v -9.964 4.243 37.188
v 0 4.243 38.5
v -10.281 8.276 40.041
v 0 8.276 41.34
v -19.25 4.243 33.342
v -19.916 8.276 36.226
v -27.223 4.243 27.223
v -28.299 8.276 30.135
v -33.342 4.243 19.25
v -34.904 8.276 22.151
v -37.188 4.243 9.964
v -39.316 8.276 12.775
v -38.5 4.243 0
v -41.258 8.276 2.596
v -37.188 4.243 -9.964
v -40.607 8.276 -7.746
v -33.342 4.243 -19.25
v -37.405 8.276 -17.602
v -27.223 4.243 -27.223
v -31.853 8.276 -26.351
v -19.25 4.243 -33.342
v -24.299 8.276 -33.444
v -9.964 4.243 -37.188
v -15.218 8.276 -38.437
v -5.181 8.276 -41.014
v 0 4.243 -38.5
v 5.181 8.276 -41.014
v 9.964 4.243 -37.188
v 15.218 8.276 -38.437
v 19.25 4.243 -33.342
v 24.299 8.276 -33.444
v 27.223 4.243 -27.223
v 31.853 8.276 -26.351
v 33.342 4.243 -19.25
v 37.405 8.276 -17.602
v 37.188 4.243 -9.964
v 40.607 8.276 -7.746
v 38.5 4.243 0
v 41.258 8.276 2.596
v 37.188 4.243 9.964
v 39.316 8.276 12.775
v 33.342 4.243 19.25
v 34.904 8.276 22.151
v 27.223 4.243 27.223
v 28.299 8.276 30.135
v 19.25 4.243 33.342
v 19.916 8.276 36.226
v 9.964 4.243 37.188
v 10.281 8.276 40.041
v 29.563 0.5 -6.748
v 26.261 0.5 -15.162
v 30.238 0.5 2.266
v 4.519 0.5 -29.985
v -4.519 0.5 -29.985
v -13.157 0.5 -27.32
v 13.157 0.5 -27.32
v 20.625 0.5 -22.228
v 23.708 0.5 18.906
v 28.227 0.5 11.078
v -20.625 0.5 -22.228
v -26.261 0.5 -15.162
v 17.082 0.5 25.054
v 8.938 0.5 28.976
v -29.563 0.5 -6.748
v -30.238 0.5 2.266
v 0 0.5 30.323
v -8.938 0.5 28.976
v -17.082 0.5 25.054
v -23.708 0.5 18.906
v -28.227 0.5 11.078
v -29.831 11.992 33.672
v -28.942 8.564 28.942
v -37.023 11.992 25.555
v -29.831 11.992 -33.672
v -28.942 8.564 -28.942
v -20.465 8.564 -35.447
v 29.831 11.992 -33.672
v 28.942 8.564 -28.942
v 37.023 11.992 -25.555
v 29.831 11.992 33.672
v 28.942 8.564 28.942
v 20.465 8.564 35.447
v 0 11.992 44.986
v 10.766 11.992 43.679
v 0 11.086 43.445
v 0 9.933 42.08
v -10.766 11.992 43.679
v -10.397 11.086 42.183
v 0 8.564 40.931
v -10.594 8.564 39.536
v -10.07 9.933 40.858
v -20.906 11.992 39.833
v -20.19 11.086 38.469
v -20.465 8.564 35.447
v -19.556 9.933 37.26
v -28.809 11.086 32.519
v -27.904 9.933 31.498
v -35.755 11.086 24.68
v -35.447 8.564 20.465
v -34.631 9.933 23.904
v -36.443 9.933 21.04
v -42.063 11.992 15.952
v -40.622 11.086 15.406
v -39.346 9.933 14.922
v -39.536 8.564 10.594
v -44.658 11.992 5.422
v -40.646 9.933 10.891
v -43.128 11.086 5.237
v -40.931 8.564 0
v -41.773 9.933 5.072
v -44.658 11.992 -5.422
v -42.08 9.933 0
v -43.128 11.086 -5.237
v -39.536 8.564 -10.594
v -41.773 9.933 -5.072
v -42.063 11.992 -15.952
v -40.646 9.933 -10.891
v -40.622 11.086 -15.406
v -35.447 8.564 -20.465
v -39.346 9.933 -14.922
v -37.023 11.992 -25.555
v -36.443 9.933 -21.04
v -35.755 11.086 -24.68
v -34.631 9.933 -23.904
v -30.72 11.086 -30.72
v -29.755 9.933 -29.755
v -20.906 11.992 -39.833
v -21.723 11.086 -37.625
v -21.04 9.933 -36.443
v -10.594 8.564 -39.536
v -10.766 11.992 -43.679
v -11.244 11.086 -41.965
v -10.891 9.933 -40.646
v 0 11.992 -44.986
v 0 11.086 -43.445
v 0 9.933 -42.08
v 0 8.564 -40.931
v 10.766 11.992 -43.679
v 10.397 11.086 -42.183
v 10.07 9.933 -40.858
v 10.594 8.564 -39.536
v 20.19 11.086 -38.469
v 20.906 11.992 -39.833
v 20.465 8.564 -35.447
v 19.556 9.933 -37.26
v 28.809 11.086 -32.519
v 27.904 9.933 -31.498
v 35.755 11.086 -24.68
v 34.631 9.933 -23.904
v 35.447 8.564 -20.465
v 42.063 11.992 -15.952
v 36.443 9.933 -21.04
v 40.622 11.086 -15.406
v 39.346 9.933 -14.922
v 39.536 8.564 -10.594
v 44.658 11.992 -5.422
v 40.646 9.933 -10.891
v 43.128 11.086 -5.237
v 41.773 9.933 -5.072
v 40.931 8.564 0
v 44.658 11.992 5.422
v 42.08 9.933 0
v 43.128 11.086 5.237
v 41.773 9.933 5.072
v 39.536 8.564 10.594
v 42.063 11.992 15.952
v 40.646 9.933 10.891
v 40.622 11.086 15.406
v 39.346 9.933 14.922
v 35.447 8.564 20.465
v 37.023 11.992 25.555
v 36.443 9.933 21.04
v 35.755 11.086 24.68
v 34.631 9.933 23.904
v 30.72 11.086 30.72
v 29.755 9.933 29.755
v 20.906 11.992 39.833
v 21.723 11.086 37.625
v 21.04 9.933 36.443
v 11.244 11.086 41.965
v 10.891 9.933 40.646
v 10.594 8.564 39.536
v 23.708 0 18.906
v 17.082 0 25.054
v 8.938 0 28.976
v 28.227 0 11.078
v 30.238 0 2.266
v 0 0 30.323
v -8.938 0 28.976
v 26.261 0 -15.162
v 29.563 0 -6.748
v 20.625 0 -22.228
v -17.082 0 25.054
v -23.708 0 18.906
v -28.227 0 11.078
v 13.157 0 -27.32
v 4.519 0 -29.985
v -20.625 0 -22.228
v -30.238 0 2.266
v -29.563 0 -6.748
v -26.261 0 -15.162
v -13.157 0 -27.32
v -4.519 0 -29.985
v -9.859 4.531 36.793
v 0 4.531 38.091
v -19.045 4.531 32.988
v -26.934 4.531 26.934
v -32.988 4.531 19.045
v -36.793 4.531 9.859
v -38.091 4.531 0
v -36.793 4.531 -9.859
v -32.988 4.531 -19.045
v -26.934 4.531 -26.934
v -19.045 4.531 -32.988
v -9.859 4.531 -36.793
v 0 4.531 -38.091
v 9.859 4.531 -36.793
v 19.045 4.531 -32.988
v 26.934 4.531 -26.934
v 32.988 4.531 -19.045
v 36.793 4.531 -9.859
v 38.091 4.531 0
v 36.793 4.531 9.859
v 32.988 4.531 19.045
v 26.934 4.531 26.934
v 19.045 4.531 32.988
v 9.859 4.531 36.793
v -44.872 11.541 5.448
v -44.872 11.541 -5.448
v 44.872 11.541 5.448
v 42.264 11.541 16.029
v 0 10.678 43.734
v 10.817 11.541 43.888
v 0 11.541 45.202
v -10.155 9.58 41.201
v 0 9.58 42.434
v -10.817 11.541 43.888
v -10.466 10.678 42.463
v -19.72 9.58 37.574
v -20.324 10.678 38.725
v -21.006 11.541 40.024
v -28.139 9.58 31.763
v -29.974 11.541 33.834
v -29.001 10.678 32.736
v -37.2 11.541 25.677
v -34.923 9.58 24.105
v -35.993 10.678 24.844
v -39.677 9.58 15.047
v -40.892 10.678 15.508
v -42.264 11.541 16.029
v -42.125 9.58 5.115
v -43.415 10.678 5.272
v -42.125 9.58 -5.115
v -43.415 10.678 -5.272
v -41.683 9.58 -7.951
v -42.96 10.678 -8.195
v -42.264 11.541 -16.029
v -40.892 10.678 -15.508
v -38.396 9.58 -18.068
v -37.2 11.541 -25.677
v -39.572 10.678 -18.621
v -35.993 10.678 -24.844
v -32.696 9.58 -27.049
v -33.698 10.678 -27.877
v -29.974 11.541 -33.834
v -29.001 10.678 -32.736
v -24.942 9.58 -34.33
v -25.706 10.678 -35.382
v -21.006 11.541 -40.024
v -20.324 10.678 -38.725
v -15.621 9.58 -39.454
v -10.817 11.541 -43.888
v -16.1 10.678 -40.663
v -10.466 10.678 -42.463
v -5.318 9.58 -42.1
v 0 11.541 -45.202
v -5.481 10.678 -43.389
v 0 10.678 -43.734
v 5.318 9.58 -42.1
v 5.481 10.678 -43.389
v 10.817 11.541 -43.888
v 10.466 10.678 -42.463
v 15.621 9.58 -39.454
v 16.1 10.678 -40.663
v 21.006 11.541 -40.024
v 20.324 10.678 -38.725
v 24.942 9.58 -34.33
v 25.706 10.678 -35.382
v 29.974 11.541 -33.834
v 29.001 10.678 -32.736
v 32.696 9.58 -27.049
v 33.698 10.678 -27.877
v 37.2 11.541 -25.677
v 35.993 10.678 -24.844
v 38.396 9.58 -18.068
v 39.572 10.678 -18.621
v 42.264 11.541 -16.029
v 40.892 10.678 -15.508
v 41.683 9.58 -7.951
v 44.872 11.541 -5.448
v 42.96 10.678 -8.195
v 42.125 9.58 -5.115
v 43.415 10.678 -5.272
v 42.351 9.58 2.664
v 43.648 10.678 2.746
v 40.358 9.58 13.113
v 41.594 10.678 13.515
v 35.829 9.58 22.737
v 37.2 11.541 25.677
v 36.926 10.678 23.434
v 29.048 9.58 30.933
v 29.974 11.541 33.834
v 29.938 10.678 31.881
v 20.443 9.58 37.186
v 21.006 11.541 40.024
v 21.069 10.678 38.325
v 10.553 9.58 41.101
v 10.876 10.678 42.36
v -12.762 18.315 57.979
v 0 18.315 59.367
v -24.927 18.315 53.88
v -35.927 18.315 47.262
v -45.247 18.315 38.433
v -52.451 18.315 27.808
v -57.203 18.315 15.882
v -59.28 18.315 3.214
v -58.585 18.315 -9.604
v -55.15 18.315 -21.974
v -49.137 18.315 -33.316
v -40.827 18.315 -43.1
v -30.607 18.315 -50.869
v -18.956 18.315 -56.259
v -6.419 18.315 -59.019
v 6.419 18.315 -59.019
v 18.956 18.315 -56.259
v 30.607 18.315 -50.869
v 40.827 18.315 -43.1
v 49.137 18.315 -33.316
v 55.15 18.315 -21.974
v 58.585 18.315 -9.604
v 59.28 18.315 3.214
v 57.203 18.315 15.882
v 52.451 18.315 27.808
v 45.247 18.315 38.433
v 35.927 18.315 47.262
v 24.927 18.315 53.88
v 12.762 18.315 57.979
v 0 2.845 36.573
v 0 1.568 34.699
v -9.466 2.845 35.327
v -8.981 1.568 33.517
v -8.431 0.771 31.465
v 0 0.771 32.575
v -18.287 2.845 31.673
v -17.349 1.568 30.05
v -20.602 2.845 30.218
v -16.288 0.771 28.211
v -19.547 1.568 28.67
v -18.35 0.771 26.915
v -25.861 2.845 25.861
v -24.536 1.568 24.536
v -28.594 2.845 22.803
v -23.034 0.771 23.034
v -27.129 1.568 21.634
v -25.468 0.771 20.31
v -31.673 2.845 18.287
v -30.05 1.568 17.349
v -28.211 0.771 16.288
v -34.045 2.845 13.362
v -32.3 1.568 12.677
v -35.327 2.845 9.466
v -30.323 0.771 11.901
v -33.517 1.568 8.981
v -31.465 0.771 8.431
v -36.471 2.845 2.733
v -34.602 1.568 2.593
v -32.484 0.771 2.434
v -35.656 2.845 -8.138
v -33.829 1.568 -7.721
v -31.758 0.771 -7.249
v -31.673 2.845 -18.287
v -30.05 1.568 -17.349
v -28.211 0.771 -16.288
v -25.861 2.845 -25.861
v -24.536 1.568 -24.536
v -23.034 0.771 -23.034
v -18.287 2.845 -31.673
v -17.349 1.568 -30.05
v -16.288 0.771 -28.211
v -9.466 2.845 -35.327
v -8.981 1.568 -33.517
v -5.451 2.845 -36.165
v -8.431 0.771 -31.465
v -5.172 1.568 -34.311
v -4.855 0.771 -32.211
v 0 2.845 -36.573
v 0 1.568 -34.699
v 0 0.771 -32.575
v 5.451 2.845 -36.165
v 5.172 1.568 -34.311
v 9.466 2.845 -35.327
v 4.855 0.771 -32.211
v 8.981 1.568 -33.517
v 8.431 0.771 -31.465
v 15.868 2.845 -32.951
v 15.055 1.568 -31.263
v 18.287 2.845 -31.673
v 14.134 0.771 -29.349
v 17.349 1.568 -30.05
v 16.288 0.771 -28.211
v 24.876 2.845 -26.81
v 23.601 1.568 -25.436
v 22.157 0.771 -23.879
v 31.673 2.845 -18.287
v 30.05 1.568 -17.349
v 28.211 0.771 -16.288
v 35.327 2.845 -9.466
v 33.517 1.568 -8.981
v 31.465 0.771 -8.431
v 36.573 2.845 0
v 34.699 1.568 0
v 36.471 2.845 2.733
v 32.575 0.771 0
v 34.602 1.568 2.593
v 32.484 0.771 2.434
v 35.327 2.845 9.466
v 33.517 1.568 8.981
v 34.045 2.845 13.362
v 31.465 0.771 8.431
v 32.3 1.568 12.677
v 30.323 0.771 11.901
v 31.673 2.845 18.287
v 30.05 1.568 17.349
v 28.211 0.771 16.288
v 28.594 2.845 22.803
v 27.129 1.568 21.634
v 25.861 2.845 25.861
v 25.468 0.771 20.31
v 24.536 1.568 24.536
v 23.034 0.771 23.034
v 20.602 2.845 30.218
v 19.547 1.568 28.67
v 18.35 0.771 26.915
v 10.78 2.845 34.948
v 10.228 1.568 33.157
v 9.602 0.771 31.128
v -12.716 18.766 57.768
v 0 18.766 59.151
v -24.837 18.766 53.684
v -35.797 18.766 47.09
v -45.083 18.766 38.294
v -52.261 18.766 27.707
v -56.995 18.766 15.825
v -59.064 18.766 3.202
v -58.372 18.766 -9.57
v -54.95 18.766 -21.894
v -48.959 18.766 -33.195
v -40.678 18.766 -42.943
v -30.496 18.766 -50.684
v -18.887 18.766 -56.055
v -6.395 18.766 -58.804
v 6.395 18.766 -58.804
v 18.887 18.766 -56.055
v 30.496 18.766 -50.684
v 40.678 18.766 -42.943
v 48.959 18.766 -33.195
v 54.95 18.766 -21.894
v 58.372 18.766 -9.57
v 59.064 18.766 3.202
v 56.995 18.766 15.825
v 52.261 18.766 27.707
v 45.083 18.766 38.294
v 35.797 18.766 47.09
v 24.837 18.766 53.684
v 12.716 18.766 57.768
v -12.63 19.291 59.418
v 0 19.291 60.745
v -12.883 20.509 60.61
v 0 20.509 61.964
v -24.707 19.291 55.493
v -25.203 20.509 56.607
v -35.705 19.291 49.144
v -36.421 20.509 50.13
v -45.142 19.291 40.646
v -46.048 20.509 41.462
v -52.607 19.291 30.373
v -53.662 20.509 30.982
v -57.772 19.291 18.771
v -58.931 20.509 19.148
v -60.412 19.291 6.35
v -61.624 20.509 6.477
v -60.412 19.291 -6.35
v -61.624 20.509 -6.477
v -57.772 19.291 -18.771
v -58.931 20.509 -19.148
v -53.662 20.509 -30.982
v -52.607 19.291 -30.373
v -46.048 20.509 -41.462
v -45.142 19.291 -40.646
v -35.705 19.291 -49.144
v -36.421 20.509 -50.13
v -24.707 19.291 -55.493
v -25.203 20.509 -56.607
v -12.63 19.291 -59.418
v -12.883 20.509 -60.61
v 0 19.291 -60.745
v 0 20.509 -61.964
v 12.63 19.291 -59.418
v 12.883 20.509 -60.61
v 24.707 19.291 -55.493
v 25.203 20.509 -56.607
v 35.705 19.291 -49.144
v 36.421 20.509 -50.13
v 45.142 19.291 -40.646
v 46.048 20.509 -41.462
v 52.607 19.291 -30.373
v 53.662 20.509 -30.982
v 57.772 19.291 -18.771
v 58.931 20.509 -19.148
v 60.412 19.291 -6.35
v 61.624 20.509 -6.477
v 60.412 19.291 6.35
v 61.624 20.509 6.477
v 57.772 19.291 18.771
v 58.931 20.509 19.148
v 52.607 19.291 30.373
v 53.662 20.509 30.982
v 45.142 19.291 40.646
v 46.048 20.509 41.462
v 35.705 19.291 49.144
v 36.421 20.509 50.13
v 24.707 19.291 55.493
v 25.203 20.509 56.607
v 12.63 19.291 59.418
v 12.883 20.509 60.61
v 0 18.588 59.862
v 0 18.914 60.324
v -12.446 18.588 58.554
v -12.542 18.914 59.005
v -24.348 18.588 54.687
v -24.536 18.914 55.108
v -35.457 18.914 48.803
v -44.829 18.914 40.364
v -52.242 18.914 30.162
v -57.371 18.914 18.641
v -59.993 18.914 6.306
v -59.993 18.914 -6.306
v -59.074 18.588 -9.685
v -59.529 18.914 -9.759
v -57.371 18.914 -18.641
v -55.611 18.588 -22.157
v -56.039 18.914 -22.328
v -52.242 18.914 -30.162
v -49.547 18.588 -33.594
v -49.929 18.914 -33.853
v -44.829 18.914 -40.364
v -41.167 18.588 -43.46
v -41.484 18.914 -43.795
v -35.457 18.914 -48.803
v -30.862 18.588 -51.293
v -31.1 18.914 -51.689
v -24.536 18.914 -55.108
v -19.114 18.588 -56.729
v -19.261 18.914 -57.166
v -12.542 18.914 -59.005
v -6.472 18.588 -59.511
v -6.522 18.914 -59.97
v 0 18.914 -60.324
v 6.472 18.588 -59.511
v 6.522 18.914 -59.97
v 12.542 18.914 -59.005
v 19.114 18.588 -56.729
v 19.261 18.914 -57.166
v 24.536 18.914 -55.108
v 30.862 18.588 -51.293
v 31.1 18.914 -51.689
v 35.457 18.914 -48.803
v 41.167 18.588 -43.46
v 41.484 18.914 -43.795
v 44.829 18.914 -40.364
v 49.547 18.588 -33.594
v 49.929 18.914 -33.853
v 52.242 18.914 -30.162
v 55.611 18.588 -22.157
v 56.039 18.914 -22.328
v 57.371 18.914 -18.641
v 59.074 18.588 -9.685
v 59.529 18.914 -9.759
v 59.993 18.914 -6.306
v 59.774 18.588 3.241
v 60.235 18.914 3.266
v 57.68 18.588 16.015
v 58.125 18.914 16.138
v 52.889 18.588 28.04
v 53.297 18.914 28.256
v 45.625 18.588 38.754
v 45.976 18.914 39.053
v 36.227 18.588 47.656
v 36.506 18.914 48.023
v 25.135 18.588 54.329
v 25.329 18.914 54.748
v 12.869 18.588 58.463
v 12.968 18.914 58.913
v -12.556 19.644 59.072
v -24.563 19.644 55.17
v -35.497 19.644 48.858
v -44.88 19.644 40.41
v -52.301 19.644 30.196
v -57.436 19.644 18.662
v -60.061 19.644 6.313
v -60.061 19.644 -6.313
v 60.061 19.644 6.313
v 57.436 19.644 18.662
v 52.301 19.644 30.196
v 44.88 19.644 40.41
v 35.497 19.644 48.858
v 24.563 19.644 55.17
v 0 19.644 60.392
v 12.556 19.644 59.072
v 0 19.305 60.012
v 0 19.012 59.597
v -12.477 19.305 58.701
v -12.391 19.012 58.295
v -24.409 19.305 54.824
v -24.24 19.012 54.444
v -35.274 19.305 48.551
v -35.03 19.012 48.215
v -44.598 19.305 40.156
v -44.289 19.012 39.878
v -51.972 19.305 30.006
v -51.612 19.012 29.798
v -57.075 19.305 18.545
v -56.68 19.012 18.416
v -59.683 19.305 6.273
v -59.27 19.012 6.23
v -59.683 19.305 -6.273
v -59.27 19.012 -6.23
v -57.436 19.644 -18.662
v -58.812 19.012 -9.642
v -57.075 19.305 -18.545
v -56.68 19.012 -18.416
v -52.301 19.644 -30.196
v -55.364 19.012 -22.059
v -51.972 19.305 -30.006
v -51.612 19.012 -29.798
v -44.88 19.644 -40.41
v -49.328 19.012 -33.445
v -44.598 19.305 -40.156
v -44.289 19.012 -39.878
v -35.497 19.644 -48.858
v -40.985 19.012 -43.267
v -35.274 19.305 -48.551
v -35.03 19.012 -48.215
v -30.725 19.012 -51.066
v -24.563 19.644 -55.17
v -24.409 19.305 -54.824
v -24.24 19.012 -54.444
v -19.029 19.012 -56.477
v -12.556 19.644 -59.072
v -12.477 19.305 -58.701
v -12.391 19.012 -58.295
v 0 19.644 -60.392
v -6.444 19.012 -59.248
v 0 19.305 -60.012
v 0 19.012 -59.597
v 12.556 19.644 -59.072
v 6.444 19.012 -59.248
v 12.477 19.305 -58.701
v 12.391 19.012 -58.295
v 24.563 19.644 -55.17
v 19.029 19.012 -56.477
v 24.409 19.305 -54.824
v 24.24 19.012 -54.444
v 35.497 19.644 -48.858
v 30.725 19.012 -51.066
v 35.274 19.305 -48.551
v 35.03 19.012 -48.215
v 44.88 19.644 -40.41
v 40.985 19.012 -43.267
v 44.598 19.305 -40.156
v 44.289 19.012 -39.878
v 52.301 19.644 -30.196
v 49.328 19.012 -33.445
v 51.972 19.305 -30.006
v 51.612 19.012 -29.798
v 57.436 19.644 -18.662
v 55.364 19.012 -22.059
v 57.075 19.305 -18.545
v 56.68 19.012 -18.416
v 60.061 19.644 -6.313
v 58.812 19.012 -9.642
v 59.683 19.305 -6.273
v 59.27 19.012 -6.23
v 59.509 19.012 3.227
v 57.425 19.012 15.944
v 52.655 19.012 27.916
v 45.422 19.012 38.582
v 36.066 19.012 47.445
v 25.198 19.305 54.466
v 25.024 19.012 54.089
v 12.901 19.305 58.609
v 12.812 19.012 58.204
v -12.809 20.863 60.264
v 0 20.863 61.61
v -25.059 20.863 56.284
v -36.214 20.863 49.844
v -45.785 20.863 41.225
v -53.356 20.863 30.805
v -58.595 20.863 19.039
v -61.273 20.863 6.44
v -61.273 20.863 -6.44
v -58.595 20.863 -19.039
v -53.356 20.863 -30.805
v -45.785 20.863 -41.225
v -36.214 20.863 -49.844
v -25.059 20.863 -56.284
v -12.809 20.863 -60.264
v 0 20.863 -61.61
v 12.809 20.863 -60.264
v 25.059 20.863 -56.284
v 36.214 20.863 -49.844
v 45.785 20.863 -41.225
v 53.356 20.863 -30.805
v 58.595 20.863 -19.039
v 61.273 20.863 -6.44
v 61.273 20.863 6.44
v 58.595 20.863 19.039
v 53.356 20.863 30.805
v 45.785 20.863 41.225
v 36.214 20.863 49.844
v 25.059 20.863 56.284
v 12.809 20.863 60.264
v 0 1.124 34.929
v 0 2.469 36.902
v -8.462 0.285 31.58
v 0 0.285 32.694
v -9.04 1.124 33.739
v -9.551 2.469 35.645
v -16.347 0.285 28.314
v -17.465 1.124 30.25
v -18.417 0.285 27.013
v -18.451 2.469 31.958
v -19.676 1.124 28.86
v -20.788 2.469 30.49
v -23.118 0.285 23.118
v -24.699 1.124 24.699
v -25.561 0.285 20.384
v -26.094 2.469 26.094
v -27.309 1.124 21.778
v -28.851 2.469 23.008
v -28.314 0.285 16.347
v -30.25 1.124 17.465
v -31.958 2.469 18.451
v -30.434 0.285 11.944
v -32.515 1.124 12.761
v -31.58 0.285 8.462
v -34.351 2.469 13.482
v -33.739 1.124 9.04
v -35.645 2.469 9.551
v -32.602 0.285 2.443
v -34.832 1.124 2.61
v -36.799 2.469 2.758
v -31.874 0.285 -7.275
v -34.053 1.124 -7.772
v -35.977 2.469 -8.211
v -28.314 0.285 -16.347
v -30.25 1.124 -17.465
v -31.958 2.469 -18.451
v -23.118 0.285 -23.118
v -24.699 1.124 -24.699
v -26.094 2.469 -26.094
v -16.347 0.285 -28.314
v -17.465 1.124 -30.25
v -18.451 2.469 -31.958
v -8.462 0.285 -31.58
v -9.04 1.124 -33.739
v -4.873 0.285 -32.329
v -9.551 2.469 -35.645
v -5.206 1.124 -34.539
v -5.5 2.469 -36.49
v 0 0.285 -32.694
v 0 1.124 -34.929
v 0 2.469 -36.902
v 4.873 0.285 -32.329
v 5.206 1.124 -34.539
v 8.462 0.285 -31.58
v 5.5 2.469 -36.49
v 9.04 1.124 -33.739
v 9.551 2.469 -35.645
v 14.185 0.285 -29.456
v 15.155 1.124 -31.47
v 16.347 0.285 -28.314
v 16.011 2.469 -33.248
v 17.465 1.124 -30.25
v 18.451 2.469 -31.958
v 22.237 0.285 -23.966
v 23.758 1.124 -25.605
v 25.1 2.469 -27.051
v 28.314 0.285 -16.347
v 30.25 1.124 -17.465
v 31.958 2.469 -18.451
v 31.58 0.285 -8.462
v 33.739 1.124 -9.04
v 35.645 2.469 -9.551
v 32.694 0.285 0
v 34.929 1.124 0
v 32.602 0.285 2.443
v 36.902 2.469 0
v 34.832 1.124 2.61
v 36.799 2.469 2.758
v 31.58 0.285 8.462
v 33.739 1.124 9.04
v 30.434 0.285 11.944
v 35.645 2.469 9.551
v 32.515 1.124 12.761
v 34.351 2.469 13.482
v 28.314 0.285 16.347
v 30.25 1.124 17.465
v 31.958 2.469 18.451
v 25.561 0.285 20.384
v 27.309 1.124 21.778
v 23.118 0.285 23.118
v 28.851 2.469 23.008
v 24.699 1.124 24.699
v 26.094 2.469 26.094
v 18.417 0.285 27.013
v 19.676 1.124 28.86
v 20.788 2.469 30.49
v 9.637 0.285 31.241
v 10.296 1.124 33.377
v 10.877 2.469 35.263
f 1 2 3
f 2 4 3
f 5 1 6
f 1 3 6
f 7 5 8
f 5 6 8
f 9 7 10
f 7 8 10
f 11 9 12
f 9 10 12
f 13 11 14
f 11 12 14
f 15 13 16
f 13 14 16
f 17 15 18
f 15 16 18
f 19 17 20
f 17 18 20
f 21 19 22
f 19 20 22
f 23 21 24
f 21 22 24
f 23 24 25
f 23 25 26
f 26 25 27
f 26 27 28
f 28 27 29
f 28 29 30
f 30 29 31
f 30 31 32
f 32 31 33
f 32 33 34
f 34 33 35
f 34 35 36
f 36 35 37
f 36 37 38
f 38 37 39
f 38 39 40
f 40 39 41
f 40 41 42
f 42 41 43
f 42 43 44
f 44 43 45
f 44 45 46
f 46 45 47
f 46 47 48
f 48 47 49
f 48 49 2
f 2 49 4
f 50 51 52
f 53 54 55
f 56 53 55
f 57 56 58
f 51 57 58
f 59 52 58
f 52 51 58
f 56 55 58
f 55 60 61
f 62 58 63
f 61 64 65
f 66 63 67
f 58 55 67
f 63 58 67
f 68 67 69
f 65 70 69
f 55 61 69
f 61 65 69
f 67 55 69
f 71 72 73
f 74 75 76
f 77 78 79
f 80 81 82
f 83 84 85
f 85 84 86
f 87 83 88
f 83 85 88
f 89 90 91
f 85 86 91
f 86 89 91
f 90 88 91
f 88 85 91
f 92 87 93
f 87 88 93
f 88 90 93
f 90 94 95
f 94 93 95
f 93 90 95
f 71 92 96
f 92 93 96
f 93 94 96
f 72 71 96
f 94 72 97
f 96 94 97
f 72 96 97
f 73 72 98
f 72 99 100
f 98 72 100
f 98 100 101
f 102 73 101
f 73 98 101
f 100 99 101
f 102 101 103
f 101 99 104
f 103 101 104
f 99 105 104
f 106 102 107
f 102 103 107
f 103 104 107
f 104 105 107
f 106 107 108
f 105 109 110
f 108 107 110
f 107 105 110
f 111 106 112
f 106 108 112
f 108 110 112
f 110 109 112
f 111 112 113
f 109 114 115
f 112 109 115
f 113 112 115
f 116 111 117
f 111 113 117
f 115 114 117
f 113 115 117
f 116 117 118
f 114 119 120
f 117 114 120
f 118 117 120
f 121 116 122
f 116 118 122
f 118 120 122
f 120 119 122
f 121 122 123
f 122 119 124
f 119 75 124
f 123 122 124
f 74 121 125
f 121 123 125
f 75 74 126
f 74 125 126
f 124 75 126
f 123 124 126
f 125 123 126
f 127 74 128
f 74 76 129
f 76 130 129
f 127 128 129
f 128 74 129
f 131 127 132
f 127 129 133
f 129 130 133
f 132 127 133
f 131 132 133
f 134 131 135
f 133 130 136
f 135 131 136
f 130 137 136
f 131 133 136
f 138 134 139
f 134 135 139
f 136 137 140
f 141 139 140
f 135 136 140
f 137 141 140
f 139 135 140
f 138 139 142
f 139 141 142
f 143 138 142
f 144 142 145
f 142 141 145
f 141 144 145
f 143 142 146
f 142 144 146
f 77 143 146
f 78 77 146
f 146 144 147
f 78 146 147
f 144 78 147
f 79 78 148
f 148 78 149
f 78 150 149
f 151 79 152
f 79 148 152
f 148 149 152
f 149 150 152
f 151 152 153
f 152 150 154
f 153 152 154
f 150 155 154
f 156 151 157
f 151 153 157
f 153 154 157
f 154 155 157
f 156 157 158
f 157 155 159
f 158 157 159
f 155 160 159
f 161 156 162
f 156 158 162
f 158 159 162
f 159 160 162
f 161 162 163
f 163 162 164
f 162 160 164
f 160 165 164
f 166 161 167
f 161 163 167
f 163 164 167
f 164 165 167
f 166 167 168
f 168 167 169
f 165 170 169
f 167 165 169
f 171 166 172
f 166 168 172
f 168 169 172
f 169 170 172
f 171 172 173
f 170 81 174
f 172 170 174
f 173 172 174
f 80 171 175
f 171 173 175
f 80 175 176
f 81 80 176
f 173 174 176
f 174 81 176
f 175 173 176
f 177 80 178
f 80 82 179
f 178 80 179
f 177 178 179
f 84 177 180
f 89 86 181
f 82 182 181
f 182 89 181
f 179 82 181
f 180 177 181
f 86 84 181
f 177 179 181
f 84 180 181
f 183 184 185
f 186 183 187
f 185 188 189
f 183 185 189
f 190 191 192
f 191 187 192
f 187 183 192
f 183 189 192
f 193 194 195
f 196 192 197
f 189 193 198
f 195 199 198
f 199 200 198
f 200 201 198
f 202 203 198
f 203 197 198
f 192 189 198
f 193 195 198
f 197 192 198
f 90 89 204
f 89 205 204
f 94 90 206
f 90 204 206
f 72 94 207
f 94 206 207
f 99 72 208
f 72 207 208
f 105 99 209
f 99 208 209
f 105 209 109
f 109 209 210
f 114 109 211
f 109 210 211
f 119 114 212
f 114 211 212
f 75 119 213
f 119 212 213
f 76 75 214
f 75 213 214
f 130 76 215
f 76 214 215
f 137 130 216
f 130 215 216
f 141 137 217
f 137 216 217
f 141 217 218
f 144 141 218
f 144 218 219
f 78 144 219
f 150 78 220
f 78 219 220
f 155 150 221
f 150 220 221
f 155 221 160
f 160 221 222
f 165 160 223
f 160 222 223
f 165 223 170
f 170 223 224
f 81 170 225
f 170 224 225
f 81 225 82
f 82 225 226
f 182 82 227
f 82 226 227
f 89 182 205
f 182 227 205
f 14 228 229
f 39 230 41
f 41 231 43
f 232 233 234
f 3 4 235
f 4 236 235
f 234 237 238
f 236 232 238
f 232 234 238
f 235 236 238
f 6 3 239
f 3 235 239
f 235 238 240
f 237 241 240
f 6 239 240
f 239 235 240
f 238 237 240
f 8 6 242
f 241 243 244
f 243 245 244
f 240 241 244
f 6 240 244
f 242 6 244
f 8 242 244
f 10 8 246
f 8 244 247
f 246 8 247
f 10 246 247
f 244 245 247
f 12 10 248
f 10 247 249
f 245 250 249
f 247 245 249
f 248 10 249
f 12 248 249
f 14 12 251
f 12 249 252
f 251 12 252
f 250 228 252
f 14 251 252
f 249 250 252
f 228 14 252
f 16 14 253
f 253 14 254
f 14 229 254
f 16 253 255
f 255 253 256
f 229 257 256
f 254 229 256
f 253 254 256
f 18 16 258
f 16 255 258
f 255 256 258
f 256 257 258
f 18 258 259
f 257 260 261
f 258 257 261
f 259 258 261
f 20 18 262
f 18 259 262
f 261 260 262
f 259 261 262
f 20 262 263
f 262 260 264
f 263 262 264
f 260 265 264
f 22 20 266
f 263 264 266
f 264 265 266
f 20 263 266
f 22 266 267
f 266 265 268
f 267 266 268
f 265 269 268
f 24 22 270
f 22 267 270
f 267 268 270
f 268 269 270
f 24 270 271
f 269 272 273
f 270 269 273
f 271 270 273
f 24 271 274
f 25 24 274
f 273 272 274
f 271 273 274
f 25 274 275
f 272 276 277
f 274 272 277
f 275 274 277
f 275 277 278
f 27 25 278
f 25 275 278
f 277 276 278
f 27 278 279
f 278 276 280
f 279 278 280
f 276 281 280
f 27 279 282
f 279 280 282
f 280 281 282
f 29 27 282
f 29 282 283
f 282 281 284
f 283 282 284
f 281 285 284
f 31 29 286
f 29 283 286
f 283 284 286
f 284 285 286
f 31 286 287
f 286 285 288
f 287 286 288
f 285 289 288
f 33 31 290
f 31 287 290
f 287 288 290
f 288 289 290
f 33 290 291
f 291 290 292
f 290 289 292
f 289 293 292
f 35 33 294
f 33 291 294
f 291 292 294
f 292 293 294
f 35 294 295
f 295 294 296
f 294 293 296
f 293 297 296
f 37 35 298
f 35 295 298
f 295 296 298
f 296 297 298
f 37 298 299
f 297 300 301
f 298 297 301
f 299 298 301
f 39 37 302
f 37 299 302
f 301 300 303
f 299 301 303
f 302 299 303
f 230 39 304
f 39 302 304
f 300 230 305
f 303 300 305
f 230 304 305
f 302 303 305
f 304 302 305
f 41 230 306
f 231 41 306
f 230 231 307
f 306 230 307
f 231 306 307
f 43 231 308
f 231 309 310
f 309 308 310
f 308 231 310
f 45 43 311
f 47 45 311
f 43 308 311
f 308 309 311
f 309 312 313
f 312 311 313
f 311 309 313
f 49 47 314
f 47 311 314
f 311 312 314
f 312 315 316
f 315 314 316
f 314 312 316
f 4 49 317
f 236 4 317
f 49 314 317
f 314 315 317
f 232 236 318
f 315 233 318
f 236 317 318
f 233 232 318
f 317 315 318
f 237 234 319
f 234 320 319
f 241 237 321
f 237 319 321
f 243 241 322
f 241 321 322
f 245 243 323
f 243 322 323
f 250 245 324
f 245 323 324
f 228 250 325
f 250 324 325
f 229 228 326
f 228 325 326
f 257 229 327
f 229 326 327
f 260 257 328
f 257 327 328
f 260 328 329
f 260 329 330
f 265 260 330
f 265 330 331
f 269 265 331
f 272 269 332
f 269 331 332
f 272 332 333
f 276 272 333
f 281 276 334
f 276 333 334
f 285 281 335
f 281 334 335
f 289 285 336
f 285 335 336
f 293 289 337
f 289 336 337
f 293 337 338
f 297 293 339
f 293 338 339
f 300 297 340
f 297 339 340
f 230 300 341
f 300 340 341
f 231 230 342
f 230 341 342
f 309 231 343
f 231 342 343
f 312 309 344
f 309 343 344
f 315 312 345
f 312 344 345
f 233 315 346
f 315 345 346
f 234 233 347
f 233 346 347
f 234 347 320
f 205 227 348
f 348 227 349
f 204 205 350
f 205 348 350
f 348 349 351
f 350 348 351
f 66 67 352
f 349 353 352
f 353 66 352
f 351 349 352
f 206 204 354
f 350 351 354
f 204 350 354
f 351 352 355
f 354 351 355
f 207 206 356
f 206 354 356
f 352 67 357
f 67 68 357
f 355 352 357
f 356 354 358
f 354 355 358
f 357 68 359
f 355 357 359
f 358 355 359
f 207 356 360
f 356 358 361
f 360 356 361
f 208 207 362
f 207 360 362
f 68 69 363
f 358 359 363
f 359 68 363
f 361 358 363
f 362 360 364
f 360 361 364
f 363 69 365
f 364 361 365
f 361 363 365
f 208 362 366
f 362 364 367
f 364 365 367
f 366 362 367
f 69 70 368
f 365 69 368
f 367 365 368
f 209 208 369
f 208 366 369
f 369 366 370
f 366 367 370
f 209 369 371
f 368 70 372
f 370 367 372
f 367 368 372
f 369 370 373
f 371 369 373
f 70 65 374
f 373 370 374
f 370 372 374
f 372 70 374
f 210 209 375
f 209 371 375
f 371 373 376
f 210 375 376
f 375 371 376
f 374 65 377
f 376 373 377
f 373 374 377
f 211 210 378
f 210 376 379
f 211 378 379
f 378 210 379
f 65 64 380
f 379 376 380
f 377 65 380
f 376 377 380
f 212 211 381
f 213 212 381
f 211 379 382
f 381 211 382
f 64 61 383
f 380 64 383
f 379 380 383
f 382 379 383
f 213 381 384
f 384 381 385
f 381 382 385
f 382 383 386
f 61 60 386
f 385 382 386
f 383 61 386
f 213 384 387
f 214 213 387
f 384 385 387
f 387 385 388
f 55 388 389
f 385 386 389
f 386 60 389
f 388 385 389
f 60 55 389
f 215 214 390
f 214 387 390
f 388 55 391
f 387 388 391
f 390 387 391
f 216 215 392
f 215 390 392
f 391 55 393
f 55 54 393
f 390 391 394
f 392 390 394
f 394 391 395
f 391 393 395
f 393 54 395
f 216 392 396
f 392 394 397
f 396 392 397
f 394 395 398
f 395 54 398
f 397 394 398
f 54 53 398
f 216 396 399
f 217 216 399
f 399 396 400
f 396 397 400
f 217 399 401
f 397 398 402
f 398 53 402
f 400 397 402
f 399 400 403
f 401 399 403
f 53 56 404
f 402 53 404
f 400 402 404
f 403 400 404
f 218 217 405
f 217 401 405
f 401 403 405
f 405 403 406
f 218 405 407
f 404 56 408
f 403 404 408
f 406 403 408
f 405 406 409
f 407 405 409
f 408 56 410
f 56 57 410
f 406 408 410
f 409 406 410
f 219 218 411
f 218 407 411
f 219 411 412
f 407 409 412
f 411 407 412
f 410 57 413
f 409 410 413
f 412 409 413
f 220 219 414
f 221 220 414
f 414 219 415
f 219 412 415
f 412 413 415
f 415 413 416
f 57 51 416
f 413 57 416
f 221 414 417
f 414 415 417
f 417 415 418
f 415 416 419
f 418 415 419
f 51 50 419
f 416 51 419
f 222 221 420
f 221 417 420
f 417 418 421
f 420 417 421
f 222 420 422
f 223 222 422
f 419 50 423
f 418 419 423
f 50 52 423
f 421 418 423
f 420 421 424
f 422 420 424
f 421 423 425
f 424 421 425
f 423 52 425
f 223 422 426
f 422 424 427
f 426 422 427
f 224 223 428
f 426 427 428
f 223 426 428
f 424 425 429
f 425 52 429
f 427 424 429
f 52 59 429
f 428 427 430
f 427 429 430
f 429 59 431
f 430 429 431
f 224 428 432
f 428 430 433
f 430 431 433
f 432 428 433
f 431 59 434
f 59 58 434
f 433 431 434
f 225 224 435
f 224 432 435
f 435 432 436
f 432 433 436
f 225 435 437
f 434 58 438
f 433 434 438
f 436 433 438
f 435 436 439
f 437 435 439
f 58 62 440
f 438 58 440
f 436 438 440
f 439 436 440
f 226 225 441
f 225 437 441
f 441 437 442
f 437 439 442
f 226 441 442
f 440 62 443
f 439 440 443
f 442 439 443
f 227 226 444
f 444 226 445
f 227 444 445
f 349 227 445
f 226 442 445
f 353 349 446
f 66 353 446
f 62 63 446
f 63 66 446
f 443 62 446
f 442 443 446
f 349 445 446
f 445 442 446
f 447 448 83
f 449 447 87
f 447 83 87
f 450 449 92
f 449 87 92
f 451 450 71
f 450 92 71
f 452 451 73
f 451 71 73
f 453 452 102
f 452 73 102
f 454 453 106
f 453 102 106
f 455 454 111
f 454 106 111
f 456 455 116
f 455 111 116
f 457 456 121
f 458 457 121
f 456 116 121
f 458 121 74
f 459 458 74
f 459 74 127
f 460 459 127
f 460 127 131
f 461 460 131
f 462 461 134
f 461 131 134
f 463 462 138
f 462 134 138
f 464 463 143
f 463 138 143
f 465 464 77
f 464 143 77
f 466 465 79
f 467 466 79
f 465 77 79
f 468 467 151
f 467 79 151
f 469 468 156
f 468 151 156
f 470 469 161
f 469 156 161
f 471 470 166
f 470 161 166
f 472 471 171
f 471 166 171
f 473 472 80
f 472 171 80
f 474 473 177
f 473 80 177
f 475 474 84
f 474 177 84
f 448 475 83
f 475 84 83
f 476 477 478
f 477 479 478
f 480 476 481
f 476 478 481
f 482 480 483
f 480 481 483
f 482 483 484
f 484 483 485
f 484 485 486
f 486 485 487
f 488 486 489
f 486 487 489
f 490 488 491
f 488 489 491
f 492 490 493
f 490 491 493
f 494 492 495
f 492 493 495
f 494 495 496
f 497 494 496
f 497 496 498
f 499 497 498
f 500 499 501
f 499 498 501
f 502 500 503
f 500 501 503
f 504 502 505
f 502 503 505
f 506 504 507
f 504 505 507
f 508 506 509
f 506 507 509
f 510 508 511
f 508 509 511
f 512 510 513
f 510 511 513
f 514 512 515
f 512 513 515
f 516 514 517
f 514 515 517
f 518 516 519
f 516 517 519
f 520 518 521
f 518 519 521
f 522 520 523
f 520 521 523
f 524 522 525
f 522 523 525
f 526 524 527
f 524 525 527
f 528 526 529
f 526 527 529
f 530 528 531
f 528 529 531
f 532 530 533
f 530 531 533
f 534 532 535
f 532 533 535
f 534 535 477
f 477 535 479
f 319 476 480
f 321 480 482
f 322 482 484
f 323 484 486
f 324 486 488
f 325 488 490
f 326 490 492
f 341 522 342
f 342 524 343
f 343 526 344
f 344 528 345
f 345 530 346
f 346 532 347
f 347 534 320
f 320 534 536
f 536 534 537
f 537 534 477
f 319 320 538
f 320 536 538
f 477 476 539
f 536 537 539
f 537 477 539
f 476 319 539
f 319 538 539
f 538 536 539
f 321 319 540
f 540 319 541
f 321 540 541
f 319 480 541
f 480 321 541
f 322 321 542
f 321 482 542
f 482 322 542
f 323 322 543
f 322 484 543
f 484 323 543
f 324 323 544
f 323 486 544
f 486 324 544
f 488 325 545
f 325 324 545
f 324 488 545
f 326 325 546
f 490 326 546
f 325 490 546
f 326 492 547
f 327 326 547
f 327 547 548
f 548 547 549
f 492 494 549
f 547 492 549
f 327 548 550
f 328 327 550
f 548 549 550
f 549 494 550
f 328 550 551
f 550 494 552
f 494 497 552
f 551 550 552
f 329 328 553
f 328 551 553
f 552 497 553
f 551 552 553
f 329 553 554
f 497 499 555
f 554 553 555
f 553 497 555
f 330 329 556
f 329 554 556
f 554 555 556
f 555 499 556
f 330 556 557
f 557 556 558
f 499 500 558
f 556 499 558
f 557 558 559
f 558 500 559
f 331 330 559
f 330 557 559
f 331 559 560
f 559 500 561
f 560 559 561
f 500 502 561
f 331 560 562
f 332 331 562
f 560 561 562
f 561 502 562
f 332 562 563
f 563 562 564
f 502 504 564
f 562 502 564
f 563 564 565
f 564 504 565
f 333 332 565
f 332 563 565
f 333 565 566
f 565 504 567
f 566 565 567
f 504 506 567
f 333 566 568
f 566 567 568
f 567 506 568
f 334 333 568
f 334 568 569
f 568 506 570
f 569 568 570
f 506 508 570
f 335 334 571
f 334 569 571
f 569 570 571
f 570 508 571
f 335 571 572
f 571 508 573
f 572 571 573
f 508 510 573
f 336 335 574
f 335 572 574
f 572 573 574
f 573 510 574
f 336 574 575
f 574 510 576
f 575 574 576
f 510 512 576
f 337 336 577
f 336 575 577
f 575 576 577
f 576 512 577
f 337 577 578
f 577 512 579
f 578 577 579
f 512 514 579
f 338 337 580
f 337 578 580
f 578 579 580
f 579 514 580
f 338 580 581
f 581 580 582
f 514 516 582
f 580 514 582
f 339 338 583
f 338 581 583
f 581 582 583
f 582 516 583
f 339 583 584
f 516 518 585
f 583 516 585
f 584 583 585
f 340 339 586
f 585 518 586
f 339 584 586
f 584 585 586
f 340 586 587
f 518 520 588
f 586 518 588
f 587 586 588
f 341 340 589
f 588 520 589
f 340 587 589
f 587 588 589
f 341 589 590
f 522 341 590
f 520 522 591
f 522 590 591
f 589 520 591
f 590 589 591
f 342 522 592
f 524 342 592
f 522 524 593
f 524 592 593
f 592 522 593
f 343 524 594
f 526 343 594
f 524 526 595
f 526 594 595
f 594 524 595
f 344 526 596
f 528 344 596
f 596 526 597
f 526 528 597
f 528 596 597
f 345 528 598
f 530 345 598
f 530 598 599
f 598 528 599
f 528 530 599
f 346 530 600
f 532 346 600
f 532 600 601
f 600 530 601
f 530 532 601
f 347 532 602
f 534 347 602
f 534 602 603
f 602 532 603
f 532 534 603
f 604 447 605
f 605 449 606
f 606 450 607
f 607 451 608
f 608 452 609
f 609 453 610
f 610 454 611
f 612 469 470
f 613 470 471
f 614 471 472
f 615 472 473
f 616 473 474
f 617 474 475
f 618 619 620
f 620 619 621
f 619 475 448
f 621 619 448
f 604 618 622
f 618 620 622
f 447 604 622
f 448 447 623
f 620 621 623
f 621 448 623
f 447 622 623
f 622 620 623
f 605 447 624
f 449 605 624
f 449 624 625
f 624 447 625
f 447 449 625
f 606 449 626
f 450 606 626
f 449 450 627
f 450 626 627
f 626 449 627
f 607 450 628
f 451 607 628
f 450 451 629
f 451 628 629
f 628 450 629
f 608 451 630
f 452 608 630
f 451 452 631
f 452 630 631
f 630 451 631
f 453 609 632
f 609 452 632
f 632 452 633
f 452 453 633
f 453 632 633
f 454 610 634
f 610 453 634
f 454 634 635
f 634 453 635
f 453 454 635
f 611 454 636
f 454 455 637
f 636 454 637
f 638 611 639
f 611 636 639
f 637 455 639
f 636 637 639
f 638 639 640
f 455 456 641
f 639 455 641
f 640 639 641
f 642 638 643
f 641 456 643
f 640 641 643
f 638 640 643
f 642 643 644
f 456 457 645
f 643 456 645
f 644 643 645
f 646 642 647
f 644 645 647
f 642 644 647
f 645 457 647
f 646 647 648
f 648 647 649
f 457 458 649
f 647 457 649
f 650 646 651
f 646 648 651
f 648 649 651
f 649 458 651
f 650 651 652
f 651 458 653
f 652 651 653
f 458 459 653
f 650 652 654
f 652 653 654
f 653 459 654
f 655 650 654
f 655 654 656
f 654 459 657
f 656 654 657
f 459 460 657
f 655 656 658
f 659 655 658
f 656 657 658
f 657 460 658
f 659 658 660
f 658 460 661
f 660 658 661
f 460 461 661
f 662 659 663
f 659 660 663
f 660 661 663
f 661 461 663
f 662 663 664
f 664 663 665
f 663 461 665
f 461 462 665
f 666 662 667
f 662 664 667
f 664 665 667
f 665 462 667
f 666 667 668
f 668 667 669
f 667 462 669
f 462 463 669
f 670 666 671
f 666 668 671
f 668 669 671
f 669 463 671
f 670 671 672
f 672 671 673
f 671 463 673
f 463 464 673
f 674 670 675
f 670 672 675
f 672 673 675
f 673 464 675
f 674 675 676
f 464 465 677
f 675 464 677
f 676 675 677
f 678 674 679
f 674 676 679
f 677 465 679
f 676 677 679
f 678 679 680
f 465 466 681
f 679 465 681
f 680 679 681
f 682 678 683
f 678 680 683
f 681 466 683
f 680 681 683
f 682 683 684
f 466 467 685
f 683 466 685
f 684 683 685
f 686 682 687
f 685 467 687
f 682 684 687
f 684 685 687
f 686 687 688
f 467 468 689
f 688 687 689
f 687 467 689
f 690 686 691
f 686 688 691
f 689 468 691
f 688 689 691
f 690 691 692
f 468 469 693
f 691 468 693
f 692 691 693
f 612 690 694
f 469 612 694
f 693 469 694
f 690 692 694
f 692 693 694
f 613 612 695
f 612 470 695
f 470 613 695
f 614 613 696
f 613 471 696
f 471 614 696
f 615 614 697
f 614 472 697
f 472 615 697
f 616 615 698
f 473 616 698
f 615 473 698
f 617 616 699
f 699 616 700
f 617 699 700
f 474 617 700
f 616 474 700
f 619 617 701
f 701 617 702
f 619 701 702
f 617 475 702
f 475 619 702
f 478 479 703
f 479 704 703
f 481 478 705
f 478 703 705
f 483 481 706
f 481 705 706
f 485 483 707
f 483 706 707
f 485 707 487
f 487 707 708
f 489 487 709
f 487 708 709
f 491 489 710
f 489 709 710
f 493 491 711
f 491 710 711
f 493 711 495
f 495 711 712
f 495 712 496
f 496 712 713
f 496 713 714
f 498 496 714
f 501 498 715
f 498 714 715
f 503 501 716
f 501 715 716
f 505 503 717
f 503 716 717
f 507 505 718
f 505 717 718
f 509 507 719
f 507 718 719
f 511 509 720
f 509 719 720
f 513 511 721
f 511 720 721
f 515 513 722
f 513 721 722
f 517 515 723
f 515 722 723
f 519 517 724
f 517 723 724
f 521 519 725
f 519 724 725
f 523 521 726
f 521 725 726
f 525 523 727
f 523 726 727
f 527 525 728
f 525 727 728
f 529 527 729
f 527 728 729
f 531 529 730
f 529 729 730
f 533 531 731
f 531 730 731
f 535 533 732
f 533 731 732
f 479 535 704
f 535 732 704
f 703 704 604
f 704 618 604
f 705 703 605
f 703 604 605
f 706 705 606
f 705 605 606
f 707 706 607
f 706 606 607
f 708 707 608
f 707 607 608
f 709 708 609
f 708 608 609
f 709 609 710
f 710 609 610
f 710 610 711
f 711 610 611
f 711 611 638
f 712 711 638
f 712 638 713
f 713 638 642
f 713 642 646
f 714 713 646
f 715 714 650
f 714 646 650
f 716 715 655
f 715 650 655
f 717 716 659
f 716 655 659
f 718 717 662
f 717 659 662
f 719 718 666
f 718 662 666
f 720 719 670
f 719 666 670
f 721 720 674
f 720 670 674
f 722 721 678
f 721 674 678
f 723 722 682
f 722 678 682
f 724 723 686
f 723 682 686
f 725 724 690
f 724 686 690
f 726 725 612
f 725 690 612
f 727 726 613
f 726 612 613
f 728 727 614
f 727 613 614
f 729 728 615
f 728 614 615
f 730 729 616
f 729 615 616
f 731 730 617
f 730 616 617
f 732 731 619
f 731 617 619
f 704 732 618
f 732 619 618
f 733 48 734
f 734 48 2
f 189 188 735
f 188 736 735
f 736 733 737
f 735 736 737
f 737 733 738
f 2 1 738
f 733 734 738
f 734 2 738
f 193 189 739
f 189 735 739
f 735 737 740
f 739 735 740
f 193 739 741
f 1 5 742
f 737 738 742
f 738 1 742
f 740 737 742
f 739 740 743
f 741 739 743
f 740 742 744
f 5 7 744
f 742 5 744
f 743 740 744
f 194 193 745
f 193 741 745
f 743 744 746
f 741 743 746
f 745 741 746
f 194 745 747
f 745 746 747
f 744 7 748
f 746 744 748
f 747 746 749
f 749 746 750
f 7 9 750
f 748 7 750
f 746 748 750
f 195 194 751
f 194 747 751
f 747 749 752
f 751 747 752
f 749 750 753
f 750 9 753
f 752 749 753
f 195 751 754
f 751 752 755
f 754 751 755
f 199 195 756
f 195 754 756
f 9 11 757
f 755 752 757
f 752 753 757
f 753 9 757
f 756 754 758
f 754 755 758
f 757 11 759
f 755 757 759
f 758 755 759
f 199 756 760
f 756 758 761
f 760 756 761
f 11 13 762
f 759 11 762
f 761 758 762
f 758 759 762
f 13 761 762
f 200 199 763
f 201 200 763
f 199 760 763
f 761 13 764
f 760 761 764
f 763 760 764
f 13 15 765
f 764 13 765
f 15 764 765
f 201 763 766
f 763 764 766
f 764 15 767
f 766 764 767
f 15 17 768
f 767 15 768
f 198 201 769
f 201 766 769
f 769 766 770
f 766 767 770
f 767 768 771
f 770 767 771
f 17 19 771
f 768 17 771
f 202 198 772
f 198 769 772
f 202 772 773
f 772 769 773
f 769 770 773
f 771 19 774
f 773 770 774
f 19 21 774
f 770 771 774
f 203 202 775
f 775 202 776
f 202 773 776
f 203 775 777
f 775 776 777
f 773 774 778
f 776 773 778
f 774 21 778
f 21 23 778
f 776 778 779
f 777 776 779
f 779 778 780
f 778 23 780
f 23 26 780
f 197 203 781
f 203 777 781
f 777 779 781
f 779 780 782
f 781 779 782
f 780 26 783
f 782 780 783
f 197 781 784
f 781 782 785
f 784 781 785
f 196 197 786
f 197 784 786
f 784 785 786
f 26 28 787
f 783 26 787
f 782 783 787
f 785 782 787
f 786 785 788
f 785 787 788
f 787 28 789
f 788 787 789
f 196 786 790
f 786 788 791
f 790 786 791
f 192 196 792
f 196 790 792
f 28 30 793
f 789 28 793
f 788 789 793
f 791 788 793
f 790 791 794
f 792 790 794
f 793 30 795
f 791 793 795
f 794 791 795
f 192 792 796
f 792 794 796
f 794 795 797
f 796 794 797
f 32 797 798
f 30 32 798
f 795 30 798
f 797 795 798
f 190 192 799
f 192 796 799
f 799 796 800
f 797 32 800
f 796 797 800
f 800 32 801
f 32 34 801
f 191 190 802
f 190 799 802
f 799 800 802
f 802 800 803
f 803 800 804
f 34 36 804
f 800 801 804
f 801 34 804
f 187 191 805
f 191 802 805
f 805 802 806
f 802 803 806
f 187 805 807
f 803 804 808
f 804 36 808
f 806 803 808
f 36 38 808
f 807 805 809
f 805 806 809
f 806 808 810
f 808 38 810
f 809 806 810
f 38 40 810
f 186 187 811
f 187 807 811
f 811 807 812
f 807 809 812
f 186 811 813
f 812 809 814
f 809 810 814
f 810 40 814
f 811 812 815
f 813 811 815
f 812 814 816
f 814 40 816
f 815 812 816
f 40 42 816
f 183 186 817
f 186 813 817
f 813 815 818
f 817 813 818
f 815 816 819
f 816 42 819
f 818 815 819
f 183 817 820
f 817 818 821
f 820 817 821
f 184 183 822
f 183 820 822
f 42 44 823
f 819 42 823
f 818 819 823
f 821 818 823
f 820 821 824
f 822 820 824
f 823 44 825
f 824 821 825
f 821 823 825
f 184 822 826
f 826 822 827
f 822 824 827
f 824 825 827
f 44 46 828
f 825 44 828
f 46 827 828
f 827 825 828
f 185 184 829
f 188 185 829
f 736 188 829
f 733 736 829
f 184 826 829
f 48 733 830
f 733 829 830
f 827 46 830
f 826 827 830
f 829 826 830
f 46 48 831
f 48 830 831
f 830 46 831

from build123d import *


with BuildPart() as part:
    # Sketch1 → Revolve-Thin2 (revolve)
    with BuildSketch(Plane.XY, mode=Mode.PRIVATE) as revolve_thin2_sk:
        with BuildLine():
            Line((0, 0), (-30.323190326, 0))
            ThreePointArc((-30.323190326, 0), (-34.9291722, 1.123912406), (-38.499810041, 4.243013806))
            Line((-38.499810041, 4.243013806), (-41.339639807, 8.276410321))
            ThreePointArc((-41.339639807, 8.276410321), (-43.060923254, 10.156742614), (-45.201704548, 11.540766343))
            Line((-45.201704548, 11.540766343), (-59.366864821, 18.315408212))
            ThreePointArc((-59.366864821, 18.315408212), (-60.097449611, 18.744382189), (-60.74512124, 19.290545415))
            Line((-60.74512124, 19.290545415), (-61.963641622, 20.509065797))
            Line((-61.963641622, 20.509065797), (-61.610088232, 20.862619188))
            Line((-61.610088232, 20.862619188), (-60.391567849, 19.644098805))
            ThreePointArc((-60.391567849, 19.644098805), (-59.808663383, 19.152551902), (-59.151137072, 18.766475323))
            Line((-59.151137072, 18.766475323), (-44.9859768, 11.991833454))
            ThreePointArc((-44.9859768, 11.991833454), (-42.73815644, 10.538608538), (-40.930808821, 8.56425963))
            Line((-40.930808821, 8.56425963), (-38.090979055, 4.530863116))
            ThreePointArc((-38.090979055, 4.530863116), (-34.698873107, 1.567716786), (-30.323190326, 0.5))
            Line((-30.323190326, 0.5), (0, 0.5))
            Line((0, 0.5), (0, 0))
        make_face()
    revolve(revolve_thin2_sk.sketch.rotate(Axis((0, 28.049813209, 0), (0, -1, 0)), 270), axis=Axis((0, 28.049813209, 0), (0, -1, 0)))


solid = part.part
